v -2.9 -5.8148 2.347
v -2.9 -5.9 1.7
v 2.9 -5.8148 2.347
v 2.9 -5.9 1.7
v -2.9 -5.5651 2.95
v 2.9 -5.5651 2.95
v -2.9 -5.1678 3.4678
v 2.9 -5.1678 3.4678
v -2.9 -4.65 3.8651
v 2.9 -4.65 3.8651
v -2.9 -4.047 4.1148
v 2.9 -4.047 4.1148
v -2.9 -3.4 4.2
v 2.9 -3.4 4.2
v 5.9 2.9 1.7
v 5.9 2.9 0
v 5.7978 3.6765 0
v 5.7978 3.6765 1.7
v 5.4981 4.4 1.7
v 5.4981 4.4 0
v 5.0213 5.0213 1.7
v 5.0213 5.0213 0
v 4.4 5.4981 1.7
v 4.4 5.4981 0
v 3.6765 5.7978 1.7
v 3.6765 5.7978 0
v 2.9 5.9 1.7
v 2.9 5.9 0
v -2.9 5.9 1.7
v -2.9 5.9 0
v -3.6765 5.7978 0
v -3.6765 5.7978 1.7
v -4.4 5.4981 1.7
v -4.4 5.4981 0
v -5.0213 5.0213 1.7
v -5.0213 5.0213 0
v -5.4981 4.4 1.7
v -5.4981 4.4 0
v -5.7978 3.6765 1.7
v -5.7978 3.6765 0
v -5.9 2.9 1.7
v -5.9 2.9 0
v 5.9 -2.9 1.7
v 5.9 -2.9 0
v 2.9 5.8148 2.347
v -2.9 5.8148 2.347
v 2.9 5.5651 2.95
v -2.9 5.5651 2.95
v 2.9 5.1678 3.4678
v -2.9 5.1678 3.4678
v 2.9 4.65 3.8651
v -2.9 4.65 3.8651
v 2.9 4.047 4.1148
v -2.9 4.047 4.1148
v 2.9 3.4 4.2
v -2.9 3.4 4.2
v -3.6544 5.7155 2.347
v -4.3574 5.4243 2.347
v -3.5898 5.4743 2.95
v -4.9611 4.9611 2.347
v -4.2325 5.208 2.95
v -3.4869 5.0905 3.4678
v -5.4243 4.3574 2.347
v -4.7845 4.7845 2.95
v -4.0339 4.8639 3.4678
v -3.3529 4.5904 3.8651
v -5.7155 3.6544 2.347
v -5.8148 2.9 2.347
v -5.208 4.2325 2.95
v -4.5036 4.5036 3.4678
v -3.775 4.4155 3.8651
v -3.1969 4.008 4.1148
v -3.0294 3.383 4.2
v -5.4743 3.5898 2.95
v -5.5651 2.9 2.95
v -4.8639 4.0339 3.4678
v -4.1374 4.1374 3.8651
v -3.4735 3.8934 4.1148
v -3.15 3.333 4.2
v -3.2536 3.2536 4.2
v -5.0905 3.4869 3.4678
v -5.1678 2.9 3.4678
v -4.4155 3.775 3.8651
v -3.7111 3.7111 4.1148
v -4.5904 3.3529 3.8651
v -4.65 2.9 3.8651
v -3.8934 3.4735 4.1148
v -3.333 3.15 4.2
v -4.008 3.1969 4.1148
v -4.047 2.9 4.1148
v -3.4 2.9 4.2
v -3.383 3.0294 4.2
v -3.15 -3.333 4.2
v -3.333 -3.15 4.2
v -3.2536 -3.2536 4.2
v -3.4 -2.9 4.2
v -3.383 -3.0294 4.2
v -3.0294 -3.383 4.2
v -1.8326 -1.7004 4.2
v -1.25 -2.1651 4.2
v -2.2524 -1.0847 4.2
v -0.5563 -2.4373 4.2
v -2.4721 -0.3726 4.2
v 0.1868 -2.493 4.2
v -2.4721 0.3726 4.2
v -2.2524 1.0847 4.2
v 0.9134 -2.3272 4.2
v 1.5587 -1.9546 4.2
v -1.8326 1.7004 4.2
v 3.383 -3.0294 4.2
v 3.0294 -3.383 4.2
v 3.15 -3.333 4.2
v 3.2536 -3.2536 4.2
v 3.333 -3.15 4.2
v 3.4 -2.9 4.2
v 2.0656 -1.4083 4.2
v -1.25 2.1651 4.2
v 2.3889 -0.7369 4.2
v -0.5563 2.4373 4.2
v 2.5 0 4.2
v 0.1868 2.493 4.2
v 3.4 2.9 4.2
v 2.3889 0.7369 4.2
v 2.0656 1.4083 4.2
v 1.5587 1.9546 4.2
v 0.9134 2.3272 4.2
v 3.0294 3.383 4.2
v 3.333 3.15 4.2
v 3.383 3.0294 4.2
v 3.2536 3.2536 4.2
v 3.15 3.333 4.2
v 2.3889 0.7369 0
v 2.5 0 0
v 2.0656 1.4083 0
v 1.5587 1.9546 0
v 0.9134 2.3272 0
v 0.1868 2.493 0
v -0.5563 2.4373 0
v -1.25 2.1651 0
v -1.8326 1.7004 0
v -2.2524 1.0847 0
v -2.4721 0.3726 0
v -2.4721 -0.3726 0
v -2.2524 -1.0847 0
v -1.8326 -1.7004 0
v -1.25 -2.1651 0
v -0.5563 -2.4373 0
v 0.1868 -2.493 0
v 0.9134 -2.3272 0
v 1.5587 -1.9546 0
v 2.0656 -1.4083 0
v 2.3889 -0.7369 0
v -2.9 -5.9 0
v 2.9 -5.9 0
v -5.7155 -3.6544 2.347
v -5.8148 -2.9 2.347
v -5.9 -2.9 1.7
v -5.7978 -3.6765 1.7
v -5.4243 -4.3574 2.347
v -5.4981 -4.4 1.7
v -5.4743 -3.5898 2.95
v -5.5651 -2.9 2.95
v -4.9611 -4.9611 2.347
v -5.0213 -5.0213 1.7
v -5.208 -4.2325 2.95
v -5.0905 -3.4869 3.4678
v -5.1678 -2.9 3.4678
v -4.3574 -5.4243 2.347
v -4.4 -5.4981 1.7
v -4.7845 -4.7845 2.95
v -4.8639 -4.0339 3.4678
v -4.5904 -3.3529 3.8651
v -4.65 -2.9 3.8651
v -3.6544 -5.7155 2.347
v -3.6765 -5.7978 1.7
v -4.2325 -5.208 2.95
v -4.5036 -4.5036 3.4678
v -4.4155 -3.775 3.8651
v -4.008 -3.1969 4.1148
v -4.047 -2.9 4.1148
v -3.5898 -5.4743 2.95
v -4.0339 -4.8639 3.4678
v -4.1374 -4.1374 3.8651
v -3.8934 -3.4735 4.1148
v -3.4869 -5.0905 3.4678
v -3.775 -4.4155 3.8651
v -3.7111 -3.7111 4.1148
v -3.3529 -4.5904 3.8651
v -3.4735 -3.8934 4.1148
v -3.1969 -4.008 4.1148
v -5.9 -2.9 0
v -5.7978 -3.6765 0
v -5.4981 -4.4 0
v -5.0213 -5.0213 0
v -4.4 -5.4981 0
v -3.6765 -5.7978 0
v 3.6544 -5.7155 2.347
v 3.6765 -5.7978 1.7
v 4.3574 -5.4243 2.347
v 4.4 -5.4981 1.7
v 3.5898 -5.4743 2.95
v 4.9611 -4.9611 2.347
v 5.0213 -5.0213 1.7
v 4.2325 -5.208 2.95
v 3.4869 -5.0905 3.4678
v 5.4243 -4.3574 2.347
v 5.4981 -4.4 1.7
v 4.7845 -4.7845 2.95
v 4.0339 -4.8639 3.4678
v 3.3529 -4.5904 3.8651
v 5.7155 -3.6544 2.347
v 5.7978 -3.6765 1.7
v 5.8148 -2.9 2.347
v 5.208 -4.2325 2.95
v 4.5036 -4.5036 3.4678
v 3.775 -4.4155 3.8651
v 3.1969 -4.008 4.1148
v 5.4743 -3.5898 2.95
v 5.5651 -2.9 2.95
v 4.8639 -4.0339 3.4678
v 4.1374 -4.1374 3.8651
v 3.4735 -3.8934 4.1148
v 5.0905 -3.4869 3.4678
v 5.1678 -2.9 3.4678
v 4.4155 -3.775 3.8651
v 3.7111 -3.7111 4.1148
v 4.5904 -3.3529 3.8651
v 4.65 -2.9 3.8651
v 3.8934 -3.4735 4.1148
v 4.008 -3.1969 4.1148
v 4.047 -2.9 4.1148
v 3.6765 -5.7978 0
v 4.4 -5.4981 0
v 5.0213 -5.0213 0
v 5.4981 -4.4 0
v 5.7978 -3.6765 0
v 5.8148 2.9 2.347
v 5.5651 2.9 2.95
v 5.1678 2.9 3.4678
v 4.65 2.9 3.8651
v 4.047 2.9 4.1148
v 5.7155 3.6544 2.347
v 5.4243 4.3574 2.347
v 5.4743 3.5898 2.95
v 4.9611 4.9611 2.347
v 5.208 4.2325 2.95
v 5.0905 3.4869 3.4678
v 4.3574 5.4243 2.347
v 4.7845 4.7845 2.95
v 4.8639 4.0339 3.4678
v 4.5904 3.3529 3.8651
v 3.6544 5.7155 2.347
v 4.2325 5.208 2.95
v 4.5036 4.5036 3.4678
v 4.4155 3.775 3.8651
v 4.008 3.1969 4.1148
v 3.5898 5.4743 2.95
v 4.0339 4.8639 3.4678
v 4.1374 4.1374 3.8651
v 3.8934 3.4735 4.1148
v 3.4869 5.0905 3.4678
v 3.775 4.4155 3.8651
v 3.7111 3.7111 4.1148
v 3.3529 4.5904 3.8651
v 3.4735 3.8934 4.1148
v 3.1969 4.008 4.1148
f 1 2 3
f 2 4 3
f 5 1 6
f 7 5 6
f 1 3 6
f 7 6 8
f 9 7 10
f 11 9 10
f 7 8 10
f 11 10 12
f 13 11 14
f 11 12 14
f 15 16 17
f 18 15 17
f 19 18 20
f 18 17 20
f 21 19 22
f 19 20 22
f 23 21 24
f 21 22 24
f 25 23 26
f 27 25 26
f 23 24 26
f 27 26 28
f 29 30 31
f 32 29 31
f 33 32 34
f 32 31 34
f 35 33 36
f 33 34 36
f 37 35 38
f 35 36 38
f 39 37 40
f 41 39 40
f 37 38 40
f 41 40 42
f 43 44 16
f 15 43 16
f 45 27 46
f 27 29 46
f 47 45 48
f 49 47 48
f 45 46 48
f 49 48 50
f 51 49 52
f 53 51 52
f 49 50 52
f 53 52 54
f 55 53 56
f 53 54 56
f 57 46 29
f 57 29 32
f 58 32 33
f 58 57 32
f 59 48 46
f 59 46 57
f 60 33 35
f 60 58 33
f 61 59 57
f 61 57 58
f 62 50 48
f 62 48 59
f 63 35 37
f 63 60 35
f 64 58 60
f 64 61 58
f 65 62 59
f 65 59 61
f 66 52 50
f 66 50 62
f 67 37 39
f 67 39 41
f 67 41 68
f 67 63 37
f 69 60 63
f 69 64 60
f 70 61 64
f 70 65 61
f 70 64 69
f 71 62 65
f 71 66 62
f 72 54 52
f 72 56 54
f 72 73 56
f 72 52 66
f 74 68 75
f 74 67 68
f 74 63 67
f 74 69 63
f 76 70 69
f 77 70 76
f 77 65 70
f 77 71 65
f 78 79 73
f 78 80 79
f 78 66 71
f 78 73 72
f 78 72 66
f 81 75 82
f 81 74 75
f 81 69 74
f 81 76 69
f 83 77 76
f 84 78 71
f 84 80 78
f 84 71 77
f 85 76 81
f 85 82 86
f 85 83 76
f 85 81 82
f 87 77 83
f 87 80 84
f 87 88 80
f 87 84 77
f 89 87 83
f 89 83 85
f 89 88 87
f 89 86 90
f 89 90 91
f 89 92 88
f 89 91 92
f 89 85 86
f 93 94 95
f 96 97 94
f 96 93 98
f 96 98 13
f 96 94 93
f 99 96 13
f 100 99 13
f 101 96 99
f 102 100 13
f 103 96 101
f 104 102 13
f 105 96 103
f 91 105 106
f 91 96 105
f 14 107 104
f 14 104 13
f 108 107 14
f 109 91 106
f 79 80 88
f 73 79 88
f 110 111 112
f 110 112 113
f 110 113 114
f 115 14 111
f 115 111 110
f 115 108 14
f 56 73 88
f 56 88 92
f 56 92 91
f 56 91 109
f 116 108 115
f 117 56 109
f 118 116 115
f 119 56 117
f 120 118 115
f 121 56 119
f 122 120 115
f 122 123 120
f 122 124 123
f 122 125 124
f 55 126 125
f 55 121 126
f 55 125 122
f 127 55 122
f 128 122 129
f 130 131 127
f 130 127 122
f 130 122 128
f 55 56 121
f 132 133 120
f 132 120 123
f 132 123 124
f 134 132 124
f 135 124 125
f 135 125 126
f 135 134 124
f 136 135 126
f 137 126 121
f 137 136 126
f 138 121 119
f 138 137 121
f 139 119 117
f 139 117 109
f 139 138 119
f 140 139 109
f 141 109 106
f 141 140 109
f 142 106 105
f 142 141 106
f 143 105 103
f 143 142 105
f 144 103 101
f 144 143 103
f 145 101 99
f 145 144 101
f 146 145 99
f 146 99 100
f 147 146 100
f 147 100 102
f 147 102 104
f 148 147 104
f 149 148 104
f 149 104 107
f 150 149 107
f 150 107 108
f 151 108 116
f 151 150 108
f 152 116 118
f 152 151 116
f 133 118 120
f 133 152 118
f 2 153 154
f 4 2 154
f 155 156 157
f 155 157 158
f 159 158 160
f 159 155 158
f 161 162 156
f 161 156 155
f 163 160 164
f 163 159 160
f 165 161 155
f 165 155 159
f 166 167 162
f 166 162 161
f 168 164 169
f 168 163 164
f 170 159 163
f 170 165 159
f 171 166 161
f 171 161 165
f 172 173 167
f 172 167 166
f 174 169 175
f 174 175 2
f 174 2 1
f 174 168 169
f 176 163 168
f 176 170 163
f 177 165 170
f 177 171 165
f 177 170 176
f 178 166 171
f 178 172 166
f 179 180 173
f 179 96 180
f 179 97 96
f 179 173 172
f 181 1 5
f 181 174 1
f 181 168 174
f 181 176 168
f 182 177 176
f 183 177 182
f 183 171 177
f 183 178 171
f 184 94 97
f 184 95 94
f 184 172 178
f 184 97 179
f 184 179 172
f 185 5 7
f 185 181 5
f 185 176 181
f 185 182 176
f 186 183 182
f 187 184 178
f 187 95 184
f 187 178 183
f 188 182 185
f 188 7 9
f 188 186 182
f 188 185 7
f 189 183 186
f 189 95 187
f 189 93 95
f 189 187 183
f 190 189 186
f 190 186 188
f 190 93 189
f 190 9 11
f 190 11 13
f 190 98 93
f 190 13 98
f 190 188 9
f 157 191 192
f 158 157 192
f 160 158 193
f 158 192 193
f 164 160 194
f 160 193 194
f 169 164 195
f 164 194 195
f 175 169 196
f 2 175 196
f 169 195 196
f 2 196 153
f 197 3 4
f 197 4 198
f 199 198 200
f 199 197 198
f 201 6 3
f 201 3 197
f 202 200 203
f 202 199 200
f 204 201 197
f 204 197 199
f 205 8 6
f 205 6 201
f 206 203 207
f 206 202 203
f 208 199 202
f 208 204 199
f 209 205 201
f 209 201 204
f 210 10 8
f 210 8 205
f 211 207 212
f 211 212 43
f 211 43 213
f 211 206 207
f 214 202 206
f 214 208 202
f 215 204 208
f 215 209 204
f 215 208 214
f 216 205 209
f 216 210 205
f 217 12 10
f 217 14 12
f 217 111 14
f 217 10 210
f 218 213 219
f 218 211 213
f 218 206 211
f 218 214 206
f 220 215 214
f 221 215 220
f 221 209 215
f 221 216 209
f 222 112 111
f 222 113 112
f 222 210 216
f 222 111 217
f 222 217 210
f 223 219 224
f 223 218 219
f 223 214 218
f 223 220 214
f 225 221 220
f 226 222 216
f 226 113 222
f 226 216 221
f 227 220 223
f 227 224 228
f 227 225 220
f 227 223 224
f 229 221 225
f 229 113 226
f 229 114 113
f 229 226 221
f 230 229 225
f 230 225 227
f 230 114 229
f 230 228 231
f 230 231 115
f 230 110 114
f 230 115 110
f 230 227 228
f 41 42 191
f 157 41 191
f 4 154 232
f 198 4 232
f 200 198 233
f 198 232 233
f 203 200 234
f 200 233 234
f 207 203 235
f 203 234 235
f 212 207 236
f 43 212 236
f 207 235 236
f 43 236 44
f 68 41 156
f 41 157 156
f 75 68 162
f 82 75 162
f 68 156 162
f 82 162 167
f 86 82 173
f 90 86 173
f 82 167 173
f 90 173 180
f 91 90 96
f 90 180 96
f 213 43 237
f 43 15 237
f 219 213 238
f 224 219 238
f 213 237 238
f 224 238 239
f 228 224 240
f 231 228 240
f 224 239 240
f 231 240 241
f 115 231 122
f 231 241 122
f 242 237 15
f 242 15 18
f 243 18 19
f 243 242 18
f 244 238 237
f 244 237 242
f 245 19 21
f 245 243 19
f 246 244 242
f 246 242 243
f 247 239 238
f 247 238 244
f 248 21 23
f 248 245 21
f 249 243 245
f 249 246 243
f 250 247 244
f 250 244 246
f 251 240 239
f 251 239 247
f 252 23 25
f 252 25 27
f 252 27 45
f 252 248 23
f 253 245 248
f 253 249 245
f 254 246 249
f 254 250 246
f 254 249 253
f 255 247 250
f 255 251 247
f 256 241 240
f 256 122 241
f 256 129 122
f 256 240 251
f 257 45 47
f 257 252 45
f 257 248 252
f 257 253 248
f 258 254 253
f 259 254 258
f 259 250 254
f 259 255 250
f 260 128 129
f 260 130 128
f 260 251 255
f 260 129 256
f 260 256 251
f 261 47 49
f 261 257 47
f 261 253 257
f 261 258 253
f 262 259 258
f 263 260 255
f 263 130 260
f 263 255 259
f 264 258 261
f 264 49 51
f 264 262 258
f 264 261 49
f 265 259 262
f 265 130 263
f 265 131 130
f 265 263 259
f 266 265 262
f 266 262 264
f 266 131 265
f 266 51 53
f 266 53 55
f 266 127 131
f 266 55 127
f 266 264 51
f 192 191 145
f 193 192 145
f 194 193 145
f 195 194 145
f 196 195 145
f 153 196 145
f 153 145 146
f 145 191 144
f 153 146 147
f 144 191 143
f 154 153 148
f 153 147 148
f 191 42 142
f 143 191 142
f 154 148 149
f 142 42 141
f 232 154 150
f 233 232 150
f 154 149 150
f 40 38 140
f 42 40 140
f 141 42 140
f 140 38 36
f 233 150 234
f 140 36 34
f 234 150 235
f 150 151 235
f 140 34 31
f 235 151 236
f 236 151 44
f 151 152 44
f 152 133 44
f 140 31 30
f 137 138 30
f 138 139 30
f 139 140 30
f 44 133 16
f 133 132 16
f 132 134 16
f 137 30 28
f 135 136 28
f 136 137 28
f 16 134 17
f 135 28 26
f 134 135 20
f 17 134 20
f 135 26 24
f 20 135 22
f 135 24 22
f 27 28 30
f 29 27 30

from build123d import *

# Parameters (mm, degrees)
SKETCH_R  = 2.5
PAD_DEPTH = 4.2
FILLET_R  = 2.5


with BuildPart() as part:
    # Sketch → Pad (new body)
    with BuildSketch(Plane.XY):
        with BuildLine():
            Line((-5.9, 2.9), (-5.9, -2.9))
            ThreePointArc((-5.9, -2.9), (-5.02132, -5.02132), (-2.9, -5.9))
            Line((-2.9, -5.9), (2.9, -5.9))
            ThreePointArc((2.9, -5.9), (5.02132, -5.02132), (5.9, -2.9))
            Line((5.9, -2.9), (5.9, 2.9))
            ThreePointArc((5.9, 2.9), (5.02132, 5.02132), (2.9, 5.9))
            Line((2.9, 5.9), (-2.9, 5.9))
            ThreePointArc((-2.9, 5.9), (-5.02132, 5.02132), (-5.9, 2.9))
        make_face()
        Circle(SKETCH_R, mode=Mode.SUBTRACT)
    extrude(amount=PAD_DEPTH)

    # Fillet
    fillet_edges = [part.edges().sort_by_distance(p)[0] for p in [
        (5.9, 0, 4.2),
    ]]
    fillet(fillet_edges, radius=FILLET_R)


solid = part.part
